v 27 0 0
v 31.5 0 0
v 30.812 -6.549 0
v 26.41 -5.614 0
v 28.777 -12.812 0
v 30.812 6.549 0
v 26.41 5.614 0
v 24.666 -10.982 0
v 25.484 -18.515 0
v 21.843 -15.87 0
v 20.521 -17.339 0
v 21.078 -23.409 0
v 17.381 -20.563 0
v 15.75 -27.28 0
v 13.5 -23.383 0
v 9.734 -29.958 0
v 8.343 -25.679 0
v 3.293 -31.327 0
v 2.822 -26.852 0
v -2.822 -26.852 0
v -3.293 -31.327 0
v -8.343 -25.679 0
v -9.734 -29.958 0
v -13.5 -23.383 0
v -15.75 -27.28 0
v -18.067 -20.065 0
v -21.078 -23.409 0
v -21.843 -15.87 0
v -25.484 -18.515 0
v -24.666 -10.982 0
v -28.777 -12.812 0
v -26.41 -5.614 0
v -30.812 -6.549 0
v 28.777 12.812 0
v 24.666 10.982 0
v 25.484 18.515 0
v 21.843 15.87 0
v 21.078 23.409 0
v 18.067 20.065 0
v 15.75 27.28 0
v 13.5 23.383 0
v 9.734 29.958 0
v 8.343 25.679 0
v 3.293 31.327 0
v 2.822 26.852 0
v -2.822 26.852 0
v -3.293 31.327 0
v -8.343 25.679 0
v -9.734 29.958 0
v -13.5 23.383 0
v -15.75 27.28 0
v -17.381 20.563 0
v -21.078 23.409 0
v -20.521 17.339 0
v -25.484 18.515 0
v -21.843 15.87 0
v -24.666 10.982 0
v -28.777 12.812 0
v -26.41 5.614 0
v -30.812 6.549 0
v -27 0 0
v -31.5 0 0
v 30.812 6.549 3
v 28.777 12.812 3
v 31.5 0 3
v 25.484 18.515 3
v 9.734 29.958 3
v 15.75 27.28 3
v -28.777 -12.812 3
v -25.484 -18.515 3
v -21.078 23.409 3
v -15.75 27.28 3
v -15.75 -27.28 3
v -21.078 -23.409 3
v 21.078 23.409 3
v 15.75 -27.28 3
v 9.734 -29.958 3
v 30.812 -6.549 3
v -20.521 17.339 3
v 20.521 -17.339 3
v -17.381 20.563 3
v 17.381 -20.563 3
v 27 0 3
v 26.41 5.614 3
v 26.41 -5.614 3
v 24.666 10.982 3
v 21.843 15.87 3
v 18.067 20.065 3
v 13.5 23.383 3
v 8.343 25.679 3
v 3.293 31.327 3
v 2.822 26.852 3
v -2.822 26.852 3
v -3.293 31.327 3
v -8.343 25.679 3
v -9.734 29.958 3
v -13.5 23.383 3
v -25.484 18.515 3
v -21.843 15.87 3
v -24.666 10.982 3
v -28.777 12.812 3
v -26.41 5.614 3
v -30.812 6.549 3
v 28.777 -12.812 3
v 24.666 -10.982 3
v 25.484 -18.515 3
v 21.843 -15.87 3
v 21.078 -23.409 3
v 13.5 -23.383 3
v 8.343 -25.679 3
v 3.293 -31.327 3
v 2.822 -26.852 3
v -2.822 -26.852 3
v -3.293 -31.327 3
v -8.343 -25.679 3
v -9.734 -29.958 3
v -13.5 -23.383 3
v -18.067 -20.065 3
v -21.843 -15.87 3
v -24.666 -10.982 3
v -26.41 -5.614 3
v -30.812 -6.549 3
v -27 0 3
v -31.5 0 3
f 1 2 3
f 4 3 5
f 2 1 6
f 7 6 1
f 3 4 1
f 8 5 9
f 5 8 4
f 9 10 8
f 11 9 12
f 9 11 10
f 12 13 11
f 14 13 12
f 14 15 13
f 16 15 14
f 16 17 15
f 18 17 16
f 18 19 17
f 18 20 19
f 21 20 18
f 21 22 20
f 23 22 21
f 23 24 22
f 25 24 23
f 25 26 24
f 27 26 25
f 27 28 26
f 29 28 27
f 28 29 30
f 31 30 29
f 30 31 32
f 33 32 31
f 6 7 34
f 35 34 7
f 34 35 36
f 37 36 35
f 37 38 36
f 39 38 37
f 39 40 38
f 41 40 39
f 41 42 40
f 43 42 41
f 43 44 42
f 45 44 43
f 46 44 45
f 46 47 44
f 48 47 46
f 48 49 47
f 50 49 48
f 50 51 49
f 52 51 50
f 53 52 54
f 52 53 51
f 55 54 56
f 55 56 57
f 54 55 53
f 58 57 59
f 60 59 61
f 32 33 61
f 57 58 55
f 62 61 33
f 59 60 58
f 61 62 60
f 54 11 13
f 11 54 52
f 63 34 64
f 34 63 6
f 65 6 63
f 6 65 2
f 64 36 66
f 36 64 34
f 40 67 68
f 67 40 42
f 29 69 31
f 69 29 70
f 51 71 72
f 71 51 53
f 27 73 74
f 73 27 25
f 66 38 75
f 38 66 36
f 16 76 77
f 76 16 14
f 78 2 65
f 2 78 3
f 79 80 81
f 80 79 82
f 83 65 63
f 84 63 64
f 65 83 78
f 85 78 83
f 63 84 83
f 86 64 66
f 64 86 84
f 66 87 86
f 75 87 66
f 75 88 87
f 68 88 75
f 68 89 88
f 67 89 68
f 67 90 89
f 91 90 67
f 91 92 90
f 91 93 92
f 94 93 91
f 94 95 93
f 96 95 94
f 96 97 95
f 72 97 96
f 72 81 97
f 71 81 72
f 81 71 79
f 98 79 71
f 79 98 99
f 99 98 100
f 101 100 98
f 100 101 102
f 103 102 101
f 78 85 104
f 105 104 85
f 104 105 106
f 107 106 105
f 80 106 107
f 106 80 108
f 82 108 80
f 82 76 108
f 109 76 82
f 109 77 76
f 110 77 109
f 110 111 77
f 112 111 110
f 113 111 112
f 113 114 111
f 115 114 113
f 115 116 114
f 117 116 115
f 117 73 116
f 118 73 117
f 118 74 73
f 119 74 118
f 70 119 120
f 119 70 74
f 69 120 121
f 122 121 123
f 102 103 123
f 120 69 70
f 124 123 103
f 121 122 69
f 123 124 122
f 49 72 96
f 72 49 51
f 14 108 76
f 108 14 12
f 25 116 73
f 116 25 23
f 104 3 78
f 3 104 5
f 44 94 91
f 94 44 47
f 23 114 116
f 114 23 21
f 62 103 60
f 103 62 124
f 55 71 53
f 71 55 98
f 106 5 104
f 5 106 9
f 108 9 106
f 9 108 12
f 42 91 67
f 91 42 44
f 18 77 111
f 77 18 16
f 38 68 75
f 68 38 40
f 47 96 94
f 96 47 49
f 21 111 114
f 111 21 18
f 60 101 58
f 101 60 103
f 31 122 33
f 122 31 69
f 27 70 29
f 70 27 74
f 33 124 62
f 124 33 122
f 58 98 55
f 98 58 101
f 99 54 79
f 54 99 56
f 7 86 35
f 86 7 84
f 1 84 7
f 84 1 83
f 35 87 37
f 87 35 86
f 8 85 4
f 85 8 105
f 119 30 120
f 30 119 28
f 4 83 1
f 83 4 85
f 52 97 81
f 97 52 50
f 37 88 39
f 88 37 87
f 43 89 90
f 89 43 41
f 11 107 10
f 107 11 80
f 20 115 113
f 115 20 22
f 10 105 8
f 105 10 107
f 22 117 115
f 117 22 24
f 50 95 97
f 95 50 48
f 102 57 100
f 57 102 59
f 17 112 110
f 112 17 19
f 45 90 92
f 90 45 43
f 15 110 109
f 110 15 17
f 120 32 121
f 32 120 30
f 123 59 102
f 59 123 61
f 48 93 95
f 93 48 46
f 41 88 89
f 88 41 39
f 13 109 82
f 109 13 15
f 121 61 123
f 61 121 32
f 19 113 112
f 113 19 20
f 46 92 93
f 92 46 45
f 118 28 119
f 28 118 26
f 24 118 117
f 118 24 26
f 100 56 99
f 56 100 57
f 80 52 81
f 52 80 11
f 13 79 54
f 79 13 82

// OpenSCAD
union() {
	difference() {
		cylinder(h = 3.0, r = 31.5);
		cylinder(h = 3.0, r = 27.0);
	}
	rotate(a = [0, 0, -45]) {
		translate(v = [-29.25, 0, 0]) {
			translate(v = [0, -2.25, 0]) {
				cube(size = [58.5, 4.5, 3.0]);
			}
		}
	}
}
